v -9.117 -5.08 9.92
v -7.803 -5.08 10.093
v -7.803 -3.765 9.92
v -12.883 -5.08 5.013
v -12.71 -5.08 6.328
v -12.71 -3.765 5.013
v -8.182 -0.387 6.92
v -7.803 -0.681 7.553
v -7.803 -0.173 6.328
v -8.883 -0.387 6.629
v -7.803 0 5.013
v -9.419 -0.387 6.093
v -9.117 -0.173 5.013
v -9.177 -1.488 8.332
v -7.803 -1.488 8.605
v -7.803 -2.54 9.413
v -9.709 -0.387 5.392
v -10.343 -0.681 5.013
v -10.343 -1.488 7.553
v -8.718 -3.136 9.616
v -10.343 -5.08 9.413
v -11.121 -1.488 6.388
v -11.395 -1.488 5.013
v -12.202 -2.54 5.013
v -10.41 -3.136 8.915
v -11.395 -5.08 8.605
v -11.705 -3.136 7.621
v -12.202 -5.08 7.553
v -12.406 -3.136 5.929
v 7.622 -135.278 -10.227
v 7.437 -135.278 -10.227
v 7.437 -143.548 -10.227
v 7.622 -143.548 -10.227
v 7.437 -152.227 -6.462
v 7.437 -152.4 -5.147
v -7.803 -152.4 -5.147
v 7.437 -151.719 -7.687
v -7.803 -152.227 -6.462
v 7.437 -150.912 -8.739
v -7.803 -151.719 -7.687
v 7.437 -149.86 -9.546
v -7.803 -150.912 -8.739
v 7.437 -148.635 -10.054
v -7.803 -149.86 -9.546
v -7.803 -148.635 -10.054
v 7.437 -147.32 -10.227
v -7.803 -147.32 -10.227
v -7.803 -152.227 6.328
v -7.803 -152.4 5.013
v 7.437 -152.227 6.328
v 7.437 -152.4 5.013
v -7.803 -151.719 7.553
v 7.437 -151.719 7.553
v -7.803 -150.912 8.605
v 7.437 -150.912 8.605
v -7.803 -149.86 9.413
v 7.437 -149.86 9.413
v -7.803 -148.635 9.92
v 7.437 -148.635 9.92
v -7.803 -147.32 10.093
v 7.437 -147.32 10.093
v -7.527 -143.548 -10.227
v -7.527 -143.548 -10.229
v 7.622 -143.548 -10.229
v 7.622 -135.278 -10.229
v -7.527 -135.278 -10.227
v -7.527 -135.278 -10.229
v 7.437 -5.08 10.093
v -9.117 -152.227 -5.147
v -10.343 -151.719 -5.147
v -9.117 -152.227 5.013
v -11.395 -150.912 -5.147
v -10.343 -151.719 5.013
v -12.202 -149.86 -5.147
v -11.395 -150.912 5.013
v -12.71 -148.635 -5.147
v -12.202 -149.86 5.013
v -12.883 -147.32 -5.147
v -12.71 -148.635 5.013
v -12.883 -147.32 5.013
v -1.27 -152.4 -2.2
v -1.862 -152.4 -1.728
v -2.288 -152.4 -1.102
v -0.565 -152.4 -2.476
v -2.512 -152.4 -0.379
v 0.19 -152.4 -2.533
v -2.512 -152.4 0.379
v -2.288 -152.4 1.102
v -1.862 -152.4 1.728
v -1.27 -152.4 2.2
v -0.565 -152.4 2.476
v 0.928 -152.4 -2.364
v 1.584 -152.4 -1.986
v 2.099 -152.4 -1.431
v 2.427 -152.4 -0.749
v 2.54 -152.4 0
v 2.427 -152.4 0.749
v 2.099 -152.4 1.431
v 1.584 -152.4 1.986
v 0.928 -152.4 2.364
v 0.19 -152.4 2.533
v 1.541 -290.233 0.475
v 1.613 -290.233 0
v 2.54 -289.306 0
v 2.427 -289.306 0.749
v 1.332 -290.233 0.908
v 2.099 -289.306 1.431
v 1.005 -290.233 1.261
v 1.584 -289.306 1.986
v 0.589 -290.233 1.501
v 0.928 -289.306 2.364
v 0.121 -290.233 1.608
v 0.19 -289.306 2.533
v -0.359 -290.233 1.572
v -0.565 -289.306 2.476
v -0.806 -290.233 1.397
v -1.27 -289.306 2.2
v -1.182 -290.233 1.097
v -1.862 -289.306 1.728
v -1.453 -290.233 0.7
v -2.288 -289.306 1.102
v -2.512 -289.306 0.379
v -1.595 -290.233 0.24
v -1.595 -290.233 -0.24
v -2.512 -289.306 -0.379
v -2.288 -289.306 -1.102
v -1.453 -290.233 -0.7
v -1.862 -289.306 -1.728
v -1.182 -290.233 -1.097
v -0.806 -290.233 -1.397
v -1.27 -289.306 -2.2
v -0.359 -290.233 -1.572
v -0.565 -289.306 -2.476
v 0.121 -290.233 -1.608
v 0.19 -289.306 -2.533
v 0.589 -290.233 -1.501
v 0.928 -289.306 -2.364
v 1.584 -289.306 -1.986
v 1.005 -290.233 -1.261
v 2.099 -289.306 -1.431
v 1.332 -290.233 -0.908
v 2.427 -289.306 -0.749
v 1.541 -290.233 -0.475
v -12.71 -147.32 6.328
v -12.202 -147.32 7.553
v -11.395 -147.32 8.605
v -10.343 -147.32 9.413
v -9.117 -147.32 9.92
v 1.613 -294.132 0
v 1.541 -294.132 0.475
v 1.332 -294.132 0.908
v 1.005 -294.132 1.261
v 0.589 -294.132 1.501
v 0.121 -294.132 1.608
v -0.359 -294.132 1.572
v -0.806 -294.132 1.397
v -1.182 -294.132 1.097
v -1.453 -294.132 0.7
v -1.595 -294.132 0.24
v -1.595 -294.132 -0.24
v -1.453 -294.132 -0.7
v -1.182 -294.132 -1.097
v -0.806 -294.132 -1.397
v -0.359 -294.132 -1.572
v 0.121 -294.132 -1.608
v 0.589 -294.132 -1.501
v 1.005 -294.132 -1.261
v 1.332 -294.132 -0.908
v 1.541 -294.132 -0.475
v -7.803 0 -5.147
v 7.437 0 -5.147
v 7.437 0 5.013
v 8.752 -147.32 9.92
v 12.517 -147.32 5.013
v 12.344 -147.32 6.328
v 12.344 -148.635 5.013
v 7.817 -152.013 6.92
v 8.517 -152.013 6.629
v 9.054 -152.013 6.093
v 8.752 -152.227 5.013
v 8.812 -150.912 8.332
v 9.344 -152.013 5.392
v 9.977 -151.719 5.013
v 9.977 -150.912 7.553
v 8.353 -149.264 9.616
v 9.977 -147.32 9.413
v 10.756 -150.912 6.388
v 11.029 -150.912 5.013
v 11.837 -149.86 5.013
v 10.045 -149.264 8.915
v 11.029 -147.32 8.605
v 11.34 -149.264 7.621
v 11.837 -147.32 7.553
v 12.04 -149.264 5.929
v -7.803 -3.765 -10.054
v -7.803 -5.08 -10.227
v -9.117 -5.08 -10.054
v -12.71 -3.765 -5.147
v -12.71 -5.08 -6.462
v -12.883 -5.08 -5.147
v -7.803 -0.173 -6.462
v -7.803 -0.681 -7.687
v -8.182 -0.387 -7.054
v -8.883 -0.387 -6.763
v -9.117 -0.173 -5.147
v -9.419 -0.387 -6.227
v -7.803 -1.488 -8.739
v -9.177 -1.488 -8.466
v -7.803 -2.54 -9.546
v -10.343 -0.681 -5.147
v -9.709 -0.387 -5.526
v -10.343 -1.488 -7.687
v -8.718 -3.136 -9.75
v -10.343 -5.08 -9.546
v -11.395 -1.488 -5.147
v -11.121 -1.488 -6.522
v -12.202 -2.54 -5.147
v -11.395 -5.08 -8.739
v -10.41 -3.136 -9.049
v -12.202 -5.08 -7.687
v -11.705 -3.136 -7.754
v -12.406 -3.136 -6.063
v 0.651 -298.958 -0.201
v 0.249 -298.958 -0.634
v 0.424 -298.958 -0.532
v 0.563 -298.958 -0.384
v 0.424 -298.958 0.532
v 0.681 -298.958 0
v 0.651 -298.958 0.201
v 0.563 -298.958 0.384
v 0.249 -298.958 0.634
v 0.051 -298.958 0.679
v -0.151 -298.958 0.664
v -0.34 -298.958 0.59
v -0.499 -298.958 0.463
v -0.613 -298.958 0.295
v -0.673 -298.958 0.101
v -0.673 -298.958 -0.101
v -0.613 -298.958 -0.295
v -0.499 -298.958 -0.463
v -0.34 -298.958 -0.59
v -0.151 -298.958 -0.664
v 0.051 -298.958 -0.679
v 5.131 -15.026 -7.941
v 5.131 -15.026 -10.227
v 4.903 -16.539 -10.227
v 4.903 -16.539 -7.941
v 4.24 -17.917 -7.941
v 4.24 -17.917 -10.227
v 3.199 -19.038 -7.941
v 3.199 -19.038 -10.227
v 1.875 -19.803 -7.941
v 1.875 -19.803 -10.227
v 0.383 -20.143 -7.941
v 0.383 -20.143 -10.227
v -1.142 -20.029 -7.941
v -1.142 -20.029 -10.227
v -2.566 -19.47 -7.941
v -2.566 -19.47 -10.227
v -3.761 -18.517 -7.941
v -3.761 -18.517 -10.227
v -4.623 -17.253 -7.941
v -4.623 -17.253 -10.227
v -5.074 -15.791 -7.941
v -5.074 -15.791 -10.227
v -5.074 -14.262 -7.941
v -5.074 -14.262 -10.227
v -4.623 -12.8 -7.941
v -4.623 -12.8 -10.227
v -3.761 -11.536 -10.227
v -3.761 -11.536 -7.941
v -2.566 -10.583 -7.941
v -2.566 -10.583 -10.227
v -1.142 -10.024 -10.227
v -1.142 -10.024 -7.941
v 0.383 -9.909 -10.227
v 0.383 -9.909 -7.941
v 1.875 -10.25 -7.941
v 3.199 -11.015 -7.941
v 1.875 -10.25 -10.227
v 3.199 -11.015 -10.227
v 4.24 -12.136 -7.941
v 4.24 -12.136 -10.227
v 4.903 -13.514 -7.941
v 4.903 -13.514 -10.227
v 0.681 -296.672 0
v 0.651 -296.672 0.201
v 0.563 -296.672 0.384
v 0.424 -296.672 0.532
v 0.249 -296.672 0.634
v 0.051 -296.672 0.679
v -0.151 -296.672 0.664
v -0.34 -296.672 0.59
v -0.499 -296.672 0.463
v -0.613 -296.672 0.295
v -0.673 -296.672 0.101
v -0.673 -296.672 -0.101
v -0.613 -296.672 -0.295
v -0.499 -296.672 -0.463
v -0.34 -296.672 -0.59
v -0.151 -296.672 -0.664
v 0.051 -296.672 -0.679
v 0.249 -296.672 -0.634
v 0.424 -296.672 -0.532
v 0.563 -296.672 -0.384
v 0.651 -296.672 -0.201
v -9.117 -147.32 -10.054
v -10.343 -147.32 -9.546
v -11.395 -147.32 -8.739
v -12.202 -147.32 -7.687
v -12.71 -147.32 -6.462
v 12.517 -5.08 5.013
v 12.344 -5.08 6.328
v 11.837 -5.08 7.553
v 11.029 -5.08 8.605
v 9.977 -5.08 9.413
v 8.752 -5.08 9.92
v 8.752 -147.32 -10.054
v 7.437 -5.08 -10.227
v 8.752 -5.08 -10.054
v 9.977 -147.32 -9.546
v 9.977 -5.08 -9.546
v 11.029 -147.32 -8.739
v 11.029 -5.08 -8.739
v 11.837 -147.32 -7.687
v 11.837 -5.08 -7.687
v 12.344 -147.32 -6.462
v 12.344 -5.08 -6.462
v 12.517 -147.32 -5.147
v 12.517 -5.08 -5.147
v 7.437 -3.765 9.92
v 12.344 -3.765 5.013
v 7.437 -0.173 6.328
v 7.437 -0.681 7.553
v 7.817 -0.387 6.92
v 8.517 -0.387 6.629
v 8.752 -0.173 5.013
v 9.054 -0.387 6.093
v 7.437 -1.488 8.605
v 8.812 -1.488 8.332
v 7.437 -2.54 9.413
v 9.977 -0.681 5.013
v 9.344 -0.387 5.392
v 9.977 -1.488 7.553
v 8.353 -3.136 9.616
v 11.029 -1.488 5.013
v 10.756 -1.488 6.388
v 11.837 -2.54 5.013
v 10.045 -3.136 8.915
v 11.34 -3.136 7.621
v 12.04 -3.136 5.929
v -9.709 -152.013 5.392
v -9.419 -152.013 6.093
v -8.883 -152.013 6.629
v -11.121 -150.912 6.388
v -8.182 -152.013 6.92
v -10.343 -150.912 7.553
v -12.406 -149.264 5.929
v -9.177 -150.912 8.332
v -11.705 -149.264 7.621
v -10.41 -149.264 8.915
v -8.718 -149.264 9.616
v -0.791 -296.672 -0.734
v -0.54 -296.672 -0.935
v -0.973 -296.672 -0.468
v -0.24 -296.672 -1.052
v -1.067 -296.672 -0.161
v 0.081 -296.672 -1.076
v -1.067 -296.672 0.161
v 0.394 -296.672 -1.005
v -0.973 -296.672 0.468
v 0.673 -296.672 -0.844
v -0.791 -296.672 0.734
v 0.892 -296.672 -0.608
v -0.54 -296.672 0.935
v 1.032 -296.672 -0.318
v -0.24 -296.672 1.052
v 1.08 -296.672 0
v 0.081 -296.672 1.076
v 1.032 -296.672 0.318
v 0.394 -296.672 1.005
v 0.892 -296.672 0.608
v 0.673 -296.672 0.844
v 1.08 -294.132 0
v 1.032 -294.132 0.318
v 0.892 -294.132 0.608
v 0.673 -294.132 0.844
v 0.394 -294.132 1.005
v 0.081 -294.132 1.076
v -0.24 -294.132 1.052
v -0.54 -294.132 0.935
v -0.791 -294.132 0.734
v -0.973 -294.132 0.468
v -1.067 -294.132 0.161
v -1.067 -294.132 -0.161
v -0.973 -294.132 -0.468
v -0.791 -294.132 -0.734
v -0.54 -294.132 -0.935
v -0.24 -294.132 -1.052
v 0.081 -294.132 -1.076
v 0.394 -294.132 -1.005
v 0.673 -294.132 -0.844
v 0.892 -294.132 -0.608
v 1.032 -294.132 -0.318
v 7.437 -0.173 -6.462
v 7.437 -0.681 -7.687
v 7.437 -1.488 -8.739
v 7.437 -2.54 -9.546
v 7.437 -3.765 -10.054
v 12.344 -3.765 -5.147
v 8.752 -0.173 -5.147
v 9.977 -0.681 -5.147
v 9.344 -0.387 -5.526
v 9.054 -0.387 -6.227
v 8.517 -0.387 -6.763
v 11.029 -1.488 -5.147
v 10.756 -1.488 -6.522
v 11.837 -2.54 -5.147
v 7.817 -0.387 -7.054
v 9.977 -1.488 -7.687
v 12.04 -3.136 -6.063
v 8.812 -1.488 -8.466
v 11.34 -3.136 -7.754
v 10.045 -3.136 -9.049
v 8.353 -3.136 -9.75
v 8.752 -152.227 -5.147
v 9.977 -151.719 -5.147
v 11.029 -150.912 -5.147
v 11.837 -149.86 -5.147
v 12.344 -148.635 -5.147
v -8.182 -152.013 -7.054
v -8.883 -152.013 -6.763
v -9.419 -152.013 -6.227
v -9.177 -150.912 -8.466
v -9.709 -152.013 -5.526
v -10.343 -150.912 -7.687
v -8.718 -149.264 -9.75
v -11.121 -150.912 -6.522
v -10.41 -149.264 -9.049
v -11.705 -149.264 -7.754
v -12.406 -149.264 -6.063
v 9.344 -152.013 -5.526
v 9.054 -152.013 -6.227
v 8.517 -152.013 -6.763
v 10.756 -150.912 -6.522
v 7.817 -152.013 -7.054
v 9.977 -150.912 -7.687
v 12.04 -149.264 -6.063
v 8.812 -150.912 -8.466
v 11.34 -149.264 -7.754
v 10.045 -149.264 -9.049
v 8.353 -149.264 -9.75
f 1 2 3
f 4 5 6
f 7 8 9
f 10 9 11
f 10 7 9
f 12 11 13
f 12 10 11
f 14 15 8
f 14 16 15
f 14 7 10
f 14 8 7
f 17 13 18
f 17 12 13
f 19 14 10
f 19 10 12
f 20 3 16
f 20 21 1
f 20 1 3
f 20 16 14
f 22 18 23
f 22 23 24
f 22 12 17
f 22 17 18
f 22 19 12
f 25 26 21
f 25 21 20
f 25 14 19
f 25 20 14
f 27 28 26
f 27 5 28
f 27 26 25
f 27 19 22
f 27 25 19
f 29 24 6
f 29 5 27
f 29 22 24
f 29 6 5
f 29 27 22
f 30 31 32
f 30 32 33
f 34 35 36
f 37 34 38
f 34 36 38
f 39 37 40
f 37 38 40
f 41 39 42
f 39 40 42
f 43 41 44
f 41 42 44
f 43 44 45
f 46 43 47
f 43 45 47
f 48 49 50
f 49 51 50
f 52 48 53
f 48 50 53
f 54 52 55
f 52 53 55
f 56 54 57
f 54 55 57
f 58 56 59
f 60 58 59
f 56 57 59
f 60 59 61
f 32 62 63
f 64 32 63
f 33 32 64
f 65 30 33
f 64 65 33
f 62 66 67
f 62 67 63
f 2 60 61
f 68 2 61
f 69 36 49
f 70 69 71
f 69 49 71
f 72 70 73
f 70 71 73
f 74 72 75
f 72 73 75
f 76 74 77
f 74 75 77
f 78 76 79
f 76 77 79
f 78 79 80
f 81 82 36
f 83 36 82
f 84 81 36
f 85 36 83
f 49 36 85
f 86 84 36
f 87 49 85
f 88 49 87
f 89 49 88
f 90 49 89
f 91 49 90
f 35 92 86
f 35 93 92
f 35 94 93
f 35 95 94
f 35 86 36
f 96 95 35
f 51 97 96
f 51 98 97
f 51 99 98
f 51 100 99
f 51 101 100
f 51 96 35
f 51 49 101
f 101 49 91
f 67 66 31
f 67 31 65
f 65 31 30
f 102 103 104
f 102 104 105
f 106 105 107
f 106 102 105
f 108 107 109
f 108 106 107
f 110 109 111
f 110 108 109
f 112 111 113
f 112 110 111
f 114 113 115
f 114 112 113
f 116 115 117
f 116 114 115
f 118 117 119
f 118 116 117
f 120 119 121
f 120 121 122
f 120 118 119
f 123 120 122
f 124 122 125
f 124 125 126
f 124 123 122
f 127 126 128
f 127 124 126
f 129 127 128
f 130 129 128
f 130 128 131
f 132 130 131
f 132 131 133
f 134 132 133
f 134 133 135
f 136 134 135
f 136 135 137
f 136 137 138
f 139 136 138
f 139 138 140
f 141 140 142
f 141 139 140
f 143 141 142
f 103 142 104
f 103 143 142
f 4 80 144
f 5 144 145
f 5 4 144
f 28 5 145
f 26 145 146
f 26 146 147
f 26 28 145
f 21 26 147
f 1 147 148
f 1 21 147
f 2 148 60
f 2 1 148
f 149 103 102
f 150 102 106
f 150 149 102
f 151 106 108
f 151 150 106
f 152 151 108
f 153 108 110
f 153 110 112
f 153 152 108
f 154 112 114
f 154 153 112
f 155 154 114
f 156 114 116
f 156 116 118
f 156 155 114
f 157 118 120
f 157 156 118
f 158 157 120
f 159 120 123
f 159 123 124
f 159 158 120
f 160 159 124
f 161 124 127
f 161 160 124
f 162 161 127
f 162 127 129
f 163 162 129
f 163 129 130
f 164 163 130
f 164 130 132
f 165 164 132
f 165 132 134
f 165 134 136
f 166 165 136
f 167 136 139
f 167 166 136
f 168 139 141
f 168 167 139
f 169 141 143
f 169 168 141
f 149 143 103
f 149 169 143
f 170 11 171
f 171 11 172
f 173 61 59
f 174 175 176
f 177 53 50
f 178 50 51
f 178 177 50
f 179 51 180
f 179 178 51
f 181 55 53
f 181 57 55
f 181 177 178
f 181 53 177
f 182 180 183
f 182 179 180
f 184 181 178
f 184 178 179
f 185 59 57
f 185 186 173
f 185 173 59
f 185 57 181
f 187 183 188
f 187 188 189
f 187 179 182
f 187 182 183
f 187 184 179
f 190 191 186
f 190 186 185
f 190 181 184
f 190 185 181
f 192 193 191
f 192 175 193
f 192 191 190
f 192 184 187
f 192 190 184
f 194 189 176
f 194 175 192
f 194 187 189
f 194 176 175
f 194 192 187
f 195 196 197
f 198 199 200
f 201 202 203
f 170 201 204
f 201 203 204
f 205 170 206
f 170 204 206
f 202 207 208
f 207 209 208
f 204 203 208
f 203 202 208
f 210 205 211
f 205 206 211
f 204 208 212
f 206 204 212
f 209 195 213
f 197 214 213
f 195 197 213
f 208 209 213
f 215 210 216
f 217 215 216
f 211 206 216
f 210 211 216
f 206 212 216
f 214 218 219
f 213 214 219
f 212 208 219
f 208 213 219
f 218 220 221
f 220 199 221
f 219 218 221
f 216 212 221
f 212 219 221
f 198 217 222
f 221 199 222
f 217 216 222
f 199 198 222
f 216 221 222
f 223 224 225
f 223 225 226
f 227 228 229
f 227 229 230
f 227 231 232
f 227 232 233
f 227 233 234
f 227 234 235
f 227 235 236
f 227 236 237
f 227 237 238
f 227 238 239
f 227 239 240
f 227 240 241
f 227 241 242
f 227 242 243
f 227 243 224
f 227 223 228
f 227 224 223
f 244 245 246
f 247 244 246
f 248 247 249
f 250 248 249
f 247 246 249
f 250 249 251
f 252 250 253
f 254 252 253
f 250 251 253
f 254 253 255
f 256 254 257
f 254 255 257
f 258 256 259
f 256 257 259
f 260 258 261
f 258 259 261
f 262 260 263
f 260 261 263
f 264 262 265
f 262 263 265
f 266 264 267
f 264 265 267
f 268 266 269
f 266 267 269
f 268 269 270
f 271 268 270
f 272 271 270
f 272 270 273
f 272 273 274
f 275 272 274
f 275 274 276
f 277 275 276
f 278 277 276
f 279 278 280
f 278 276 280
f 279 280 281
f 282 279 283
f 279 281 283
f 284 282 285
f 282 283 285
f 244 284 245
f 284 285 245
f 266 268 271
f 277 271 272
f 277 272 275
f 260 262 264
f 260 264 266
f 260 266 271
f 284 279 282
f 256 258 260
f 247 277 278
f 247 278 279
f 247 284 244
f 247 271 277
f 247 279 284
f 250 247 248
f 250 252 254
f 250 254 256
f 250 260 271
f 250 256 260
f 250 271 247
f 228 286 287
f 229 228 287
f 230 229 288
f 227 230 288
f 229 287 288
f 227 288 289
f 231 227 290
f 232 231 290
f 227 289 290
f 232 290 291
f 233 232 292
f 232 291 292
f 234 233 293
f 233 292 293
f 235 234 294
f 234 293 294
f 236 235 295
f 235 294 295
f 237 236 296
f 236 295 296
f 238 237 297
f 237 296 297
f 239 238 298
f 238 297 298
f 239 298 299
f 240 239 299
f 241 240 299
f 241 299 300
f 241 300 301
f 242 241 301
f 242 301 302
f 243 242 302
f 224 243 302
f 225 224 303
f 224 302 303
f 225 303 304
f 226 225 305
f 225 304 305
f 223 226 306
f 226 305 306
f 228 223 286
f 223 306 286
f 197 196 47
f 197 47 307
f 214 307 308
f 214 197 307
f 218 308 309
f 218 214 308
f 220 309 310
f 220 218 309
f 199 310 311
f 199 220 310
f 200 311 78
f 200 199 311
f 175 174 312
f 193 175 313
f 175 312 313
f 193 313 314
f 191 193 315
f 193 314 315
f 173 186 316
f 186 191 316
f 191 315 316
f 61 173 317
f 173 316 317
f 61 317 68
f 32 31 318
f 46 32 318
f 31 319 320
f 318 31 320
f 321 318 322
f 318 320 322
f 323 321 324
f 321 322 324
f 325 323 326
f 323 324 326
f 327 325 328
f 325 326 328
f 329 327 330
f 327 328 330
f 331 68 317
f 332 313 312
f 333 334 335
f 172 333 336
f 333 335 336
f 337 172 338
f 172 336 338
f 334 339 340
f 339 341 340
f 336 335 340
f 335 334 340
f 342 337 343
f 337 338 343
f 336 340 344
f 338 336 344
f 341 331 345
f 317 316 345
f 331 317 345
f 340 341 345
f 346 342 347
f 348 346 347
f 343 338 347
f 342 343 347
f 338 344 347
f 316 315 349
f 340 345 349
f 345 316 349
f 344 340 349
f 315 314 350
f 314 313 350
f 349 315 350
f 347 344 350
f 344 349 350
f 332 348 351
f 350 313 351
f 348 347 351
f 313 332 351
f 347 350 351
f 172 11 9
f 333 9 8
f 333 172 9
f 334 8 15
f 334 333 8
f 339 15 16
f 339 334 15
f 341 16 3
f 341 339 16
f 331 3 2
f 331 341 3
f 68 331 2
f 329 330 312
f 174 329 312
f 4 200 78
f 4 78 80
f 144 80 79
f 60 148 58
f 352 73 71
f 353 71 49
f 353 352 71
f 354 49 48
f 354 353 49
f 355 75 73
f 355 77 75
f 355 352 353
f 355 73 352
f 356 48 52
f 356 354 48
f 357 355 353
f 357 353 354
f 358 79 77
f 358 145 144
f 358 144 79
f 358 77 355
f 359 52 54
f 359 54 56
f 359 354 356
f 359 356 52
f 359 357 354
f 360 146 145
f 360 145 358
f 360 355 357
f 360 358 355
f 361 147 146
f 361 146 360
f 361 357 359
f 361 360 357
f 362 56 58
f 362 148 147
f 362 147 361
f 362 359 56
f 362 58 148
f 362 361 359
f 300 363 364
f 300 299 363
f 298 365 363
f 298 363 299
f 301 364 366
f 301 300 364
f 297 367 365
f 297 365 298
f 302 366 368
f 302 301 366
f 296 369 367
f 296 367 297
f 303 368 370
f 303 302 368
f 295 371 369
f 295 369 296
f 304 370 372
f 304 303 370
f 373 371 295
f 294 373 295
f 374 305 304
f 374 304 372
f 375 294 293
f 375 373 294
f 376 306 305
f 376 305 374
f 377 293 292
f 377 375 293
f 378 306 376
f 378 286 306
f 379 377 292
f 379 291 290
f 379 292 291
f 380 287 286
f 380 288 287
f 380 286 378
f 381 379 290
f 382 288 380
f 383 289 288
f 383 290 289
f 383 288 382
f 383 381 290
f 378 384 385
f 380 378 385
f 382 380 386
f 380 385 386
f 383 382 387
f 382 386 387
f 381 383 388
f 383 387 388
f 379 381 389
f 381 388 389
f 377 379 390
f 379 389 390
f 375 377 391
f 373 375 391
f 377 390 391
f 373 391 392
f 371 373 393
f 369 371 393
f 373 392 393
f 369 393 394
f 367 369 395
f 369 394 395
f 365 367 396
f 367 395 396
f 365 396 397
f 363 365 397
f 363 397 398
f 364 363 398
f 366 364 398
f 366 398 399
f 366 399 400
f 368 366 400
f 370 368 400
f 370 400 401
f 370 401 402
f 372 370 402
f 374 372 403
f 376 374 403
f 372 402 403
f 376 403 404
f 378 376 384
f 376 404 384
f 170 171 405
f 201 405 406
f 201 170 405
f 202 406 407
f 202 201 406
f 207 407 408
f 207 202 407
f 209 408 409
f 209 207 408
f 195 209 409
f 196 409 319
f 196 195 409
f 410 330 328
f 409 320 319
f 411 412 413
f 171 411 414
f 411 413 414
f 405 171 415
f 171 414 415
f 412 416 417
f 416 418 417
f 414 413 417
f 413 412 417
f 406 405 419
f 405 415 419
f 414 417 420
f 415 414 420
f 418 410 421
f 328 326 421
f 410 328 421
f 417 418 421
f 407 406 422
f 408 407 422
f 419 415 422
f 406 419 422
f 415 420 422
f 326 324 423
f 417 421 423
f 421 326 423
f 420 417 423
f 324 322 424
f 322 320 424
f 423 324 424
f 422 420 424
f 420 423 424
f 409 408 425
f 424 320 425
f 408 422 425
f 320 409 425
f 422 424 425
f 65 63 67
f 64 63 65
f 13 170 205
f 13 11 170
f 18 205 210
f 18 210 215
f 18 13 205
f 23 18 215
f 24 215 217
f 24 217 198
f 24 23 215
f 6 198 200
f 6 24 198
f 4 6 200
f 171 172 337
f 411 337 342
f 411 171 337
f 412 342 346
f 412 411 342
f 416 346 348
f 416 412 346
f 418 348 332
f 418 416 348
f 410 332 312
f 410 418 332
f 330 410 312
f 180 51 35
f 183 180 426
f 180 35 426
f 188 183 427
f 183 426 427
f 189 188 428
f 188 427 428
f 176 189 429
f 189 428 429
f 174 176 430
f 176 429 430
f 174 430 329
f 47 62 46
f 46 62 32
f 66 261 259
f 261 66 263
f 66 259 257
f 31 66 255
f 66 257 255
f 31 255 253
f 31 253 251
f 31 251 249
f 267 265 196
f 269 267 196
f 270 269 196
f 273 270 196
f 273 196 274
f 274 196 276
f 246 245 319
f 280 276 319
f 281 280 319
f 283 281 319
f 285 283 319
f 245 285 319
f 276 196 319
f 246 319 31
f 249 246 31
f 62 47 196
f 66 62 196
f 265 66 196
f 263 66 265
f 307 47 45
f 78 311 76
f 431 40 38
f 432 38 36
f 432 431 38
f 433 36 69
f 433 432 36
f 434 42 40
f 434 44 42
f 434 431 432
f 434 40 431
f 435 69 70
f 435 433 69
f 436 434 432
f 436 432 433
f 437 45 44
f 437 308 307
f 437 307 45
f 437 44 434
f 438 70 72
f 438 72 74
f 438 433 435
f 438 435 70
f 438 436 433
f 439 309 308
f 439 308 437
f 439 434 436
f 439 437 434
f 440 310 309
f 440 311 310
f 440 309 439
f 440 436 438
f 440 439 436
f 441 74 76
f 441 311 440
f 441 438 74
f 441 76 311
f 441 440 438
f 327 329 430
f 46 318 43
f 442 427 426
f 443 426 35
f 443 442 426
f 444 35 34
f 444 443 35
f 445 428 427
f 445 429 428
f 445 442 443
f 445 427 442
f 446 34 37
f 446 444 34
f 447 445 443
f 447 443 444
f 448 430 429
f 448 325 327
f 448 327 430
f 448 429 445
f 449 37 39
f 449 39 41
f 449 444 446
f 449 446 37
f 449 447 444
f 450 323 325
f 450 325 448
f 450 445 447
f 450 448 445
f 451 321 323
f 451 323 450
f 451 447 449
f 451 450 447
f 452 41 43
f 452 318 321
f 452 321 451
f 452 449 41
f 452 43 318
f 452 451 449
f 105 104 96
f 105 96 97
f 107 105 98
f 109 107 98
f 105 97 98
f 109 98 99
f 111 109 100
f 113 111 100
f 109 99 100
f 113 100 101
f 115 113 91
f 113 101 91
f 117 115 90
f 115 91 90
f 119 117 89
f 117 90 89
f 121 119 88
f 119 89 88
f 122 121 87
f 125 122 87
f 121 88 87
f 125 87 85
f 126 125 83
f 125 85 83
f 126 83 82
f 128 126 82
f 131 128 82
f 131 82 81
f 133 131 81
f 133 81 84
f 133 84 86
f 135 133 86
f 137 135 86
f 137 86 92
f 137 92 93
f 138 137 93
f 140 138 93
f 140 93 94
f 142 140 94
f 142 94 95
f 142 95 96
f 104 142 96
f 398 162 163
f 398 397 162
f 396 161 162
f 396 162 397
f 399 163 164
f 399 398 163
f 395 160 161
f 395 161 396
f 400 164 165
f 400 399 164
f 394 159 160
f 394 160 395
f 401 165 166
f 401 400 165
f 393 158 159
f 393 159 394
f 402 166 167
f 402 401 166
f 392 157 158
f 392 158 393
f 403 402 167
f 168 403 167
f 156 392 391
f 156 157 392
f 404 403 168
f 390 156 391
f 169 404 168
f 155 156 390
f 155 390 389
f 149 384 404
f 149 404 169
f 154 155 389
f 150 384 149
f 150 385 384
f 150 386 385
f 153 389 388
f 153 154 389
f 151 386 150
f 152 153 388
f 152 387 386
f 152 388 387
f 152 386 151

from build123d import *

# Parameters (mm, degrees)
F0_W         = 25.4
F0_H         = 20.32
F1_DEPTH     = 127
F2_R         = 5.08
F3_R         = 5.08
F4_R         = 5.08
F5_DEPTH     = 25.4
F6_R         = 2.54
F7_DEPTH     = 139.192
F8_R         = 5.08
F9_R         = 1.6125595219
F10_DEPTH    = 2.54
F11_R        = 1.0795
F12_DEPTH    = 2.54
F13_R        = 0.680816043
F14_DEPTH    = 2.286
F15_S5_R     = 1.6125595219
F15_T6_DEPTH = 5
F16_R        = 5.1312830473
F17_DEPTH    = 2.286
F18_W        = 15.1486136019
F18_H        = 8.2696229219
F19_DEPTH    = 0.00254


# Not quite as in the source:
# - a fillet or chamfer that OpenCascade refuses, or shapes differently, is made with other operations: its cross-section is extruded or revolved along the edge and cut away or added


with BuildPart() as f1:
    # F0 (on Front) → F1 (new body)
    with BuildSketch(Plane.XZ):
        with Locations((-0.1826275468, -0.0669072086)):
            Rectangle(F0_W, F0_H)
    extrude(amount=F1_DEPTH)

    # F2
    f2_edges = [f1.edges().sort_by_distance(p)[0] for p in [
        (12.517372, -63.5, 10.093093),
        (12.517372, -63.5, -10.226907),
    ]]
    fillet(f2_edges, radius=F2_R)

    # F3
    f3_edges = [f1.edges().sort_by_distance(p)[0] for p in [
        (-12.882628, -63.5, -10.226907),
    ]]
    fillet(f3_edges, radius=F3_R)

    # F4
    f4_edges = [f1.edges().sort_by_distance(p)[0] for p in [
        (-12.882628, -63.5, 10.093093),
        (-12.882628, 0, 2.473093),
    ]]
    fillet(f4_edges, radius=F4_R)

    # F5 (add): a face of the model
    f5_faces = [f1.faces().sort_by_distance(p)[0] for p in [
        (-0.1826275468, -127, -0.0669072086),
    ]]
    extrude(f5_faces, amount=F5_DEPTH)

    # F6 (on face) → F7 (join)
    with BuildSketch(Plane.XZ.offset(152.4)):
        Circle(F6_R)
    extrude(amount=F7_DEPTH)

    # F8
    f8_edges = [f1.edges().sort_by_distance(p)[0] for p in [
        (-0.182628, -152.4, 10.093093),
        (-0.182628, -152.4, -10.226907),
        (12.517372, -152.4, -0.066907),
        (-12.882628, -152.4, -0.066907),
    ]]
    fillet(f8_edges, radius=F8_R)

    # F9 (on face) → F10 (join)
    with BuildSketch(Plane.XZ.offset(291.592)):
        Circle(F9_R)
    extrude(amount=F10_DEPTH)

    # F11 (on face) → F12 (join)
    with BuildSketch(Plane.XZ.offset(294.132)):
        Circle(F11_R)
    extrude(amount=F12_DEPTH)

    # F13 (on face) → F14 (join)
    with BuildSketch(Plane.XZ.offset(296.672)):
        Circle(F13_R)
    extrude(amount=F14_DEPTH)

    # F15: chamfer of 2.286 on 1 edges, made by hand


with BuildPart() as f15_tool2:
    # F15_s3 → F15_t4 (revolve)
    with BuildSketch(Plane.XY):
        Polygon((2.54, -289.306), (0.254, -291.592), (2.54, -291.592), align=None)
    revolve(axis=Axis((0, -291.592, 0), (0, -1, 0)))

    # F15_s5 → F15_t6 (cut, symmetric)
    with BuildSketch(Plane.XZ.offset(290.4)):
        Circle(F15_S5_R)
    extrude(amount=F15_T6_DEPTH, both=True, mode=Mode.SUBTRACT)


with BuildPart() as f1_1:
    add(f1.part)

    # F15_t1: cut F15_tool2
    add(f15_tool2.part, mode=Mode.SUBTRACT)

    # F16 (on face) → F17 (cut)
    with BuildSketch(Plane(origin=(0, 0, -10.2269072086), x_dir=(1, 0, 0), z_dir=(0, 0, -1))):
        with Locations((0, 15.0263812393)):
            Circle(F16_R)
    extrude(amount=-F17_DEPTH, mode=Mode.SUBTRACT)

    # F18 (on face) → F19 (join)
    with BuildSketch(Plane(origin=(0, 0, -10.2269072086), x_dir=(1, 0, 0), z_dir=(0, 0, -1))):
        with Locations((0.0473735854, 139.4127830863)):
            Rectangle(F18_W, F18_H)
    extrude(amount=F19_DEPTH)


solid = f1_1.part
